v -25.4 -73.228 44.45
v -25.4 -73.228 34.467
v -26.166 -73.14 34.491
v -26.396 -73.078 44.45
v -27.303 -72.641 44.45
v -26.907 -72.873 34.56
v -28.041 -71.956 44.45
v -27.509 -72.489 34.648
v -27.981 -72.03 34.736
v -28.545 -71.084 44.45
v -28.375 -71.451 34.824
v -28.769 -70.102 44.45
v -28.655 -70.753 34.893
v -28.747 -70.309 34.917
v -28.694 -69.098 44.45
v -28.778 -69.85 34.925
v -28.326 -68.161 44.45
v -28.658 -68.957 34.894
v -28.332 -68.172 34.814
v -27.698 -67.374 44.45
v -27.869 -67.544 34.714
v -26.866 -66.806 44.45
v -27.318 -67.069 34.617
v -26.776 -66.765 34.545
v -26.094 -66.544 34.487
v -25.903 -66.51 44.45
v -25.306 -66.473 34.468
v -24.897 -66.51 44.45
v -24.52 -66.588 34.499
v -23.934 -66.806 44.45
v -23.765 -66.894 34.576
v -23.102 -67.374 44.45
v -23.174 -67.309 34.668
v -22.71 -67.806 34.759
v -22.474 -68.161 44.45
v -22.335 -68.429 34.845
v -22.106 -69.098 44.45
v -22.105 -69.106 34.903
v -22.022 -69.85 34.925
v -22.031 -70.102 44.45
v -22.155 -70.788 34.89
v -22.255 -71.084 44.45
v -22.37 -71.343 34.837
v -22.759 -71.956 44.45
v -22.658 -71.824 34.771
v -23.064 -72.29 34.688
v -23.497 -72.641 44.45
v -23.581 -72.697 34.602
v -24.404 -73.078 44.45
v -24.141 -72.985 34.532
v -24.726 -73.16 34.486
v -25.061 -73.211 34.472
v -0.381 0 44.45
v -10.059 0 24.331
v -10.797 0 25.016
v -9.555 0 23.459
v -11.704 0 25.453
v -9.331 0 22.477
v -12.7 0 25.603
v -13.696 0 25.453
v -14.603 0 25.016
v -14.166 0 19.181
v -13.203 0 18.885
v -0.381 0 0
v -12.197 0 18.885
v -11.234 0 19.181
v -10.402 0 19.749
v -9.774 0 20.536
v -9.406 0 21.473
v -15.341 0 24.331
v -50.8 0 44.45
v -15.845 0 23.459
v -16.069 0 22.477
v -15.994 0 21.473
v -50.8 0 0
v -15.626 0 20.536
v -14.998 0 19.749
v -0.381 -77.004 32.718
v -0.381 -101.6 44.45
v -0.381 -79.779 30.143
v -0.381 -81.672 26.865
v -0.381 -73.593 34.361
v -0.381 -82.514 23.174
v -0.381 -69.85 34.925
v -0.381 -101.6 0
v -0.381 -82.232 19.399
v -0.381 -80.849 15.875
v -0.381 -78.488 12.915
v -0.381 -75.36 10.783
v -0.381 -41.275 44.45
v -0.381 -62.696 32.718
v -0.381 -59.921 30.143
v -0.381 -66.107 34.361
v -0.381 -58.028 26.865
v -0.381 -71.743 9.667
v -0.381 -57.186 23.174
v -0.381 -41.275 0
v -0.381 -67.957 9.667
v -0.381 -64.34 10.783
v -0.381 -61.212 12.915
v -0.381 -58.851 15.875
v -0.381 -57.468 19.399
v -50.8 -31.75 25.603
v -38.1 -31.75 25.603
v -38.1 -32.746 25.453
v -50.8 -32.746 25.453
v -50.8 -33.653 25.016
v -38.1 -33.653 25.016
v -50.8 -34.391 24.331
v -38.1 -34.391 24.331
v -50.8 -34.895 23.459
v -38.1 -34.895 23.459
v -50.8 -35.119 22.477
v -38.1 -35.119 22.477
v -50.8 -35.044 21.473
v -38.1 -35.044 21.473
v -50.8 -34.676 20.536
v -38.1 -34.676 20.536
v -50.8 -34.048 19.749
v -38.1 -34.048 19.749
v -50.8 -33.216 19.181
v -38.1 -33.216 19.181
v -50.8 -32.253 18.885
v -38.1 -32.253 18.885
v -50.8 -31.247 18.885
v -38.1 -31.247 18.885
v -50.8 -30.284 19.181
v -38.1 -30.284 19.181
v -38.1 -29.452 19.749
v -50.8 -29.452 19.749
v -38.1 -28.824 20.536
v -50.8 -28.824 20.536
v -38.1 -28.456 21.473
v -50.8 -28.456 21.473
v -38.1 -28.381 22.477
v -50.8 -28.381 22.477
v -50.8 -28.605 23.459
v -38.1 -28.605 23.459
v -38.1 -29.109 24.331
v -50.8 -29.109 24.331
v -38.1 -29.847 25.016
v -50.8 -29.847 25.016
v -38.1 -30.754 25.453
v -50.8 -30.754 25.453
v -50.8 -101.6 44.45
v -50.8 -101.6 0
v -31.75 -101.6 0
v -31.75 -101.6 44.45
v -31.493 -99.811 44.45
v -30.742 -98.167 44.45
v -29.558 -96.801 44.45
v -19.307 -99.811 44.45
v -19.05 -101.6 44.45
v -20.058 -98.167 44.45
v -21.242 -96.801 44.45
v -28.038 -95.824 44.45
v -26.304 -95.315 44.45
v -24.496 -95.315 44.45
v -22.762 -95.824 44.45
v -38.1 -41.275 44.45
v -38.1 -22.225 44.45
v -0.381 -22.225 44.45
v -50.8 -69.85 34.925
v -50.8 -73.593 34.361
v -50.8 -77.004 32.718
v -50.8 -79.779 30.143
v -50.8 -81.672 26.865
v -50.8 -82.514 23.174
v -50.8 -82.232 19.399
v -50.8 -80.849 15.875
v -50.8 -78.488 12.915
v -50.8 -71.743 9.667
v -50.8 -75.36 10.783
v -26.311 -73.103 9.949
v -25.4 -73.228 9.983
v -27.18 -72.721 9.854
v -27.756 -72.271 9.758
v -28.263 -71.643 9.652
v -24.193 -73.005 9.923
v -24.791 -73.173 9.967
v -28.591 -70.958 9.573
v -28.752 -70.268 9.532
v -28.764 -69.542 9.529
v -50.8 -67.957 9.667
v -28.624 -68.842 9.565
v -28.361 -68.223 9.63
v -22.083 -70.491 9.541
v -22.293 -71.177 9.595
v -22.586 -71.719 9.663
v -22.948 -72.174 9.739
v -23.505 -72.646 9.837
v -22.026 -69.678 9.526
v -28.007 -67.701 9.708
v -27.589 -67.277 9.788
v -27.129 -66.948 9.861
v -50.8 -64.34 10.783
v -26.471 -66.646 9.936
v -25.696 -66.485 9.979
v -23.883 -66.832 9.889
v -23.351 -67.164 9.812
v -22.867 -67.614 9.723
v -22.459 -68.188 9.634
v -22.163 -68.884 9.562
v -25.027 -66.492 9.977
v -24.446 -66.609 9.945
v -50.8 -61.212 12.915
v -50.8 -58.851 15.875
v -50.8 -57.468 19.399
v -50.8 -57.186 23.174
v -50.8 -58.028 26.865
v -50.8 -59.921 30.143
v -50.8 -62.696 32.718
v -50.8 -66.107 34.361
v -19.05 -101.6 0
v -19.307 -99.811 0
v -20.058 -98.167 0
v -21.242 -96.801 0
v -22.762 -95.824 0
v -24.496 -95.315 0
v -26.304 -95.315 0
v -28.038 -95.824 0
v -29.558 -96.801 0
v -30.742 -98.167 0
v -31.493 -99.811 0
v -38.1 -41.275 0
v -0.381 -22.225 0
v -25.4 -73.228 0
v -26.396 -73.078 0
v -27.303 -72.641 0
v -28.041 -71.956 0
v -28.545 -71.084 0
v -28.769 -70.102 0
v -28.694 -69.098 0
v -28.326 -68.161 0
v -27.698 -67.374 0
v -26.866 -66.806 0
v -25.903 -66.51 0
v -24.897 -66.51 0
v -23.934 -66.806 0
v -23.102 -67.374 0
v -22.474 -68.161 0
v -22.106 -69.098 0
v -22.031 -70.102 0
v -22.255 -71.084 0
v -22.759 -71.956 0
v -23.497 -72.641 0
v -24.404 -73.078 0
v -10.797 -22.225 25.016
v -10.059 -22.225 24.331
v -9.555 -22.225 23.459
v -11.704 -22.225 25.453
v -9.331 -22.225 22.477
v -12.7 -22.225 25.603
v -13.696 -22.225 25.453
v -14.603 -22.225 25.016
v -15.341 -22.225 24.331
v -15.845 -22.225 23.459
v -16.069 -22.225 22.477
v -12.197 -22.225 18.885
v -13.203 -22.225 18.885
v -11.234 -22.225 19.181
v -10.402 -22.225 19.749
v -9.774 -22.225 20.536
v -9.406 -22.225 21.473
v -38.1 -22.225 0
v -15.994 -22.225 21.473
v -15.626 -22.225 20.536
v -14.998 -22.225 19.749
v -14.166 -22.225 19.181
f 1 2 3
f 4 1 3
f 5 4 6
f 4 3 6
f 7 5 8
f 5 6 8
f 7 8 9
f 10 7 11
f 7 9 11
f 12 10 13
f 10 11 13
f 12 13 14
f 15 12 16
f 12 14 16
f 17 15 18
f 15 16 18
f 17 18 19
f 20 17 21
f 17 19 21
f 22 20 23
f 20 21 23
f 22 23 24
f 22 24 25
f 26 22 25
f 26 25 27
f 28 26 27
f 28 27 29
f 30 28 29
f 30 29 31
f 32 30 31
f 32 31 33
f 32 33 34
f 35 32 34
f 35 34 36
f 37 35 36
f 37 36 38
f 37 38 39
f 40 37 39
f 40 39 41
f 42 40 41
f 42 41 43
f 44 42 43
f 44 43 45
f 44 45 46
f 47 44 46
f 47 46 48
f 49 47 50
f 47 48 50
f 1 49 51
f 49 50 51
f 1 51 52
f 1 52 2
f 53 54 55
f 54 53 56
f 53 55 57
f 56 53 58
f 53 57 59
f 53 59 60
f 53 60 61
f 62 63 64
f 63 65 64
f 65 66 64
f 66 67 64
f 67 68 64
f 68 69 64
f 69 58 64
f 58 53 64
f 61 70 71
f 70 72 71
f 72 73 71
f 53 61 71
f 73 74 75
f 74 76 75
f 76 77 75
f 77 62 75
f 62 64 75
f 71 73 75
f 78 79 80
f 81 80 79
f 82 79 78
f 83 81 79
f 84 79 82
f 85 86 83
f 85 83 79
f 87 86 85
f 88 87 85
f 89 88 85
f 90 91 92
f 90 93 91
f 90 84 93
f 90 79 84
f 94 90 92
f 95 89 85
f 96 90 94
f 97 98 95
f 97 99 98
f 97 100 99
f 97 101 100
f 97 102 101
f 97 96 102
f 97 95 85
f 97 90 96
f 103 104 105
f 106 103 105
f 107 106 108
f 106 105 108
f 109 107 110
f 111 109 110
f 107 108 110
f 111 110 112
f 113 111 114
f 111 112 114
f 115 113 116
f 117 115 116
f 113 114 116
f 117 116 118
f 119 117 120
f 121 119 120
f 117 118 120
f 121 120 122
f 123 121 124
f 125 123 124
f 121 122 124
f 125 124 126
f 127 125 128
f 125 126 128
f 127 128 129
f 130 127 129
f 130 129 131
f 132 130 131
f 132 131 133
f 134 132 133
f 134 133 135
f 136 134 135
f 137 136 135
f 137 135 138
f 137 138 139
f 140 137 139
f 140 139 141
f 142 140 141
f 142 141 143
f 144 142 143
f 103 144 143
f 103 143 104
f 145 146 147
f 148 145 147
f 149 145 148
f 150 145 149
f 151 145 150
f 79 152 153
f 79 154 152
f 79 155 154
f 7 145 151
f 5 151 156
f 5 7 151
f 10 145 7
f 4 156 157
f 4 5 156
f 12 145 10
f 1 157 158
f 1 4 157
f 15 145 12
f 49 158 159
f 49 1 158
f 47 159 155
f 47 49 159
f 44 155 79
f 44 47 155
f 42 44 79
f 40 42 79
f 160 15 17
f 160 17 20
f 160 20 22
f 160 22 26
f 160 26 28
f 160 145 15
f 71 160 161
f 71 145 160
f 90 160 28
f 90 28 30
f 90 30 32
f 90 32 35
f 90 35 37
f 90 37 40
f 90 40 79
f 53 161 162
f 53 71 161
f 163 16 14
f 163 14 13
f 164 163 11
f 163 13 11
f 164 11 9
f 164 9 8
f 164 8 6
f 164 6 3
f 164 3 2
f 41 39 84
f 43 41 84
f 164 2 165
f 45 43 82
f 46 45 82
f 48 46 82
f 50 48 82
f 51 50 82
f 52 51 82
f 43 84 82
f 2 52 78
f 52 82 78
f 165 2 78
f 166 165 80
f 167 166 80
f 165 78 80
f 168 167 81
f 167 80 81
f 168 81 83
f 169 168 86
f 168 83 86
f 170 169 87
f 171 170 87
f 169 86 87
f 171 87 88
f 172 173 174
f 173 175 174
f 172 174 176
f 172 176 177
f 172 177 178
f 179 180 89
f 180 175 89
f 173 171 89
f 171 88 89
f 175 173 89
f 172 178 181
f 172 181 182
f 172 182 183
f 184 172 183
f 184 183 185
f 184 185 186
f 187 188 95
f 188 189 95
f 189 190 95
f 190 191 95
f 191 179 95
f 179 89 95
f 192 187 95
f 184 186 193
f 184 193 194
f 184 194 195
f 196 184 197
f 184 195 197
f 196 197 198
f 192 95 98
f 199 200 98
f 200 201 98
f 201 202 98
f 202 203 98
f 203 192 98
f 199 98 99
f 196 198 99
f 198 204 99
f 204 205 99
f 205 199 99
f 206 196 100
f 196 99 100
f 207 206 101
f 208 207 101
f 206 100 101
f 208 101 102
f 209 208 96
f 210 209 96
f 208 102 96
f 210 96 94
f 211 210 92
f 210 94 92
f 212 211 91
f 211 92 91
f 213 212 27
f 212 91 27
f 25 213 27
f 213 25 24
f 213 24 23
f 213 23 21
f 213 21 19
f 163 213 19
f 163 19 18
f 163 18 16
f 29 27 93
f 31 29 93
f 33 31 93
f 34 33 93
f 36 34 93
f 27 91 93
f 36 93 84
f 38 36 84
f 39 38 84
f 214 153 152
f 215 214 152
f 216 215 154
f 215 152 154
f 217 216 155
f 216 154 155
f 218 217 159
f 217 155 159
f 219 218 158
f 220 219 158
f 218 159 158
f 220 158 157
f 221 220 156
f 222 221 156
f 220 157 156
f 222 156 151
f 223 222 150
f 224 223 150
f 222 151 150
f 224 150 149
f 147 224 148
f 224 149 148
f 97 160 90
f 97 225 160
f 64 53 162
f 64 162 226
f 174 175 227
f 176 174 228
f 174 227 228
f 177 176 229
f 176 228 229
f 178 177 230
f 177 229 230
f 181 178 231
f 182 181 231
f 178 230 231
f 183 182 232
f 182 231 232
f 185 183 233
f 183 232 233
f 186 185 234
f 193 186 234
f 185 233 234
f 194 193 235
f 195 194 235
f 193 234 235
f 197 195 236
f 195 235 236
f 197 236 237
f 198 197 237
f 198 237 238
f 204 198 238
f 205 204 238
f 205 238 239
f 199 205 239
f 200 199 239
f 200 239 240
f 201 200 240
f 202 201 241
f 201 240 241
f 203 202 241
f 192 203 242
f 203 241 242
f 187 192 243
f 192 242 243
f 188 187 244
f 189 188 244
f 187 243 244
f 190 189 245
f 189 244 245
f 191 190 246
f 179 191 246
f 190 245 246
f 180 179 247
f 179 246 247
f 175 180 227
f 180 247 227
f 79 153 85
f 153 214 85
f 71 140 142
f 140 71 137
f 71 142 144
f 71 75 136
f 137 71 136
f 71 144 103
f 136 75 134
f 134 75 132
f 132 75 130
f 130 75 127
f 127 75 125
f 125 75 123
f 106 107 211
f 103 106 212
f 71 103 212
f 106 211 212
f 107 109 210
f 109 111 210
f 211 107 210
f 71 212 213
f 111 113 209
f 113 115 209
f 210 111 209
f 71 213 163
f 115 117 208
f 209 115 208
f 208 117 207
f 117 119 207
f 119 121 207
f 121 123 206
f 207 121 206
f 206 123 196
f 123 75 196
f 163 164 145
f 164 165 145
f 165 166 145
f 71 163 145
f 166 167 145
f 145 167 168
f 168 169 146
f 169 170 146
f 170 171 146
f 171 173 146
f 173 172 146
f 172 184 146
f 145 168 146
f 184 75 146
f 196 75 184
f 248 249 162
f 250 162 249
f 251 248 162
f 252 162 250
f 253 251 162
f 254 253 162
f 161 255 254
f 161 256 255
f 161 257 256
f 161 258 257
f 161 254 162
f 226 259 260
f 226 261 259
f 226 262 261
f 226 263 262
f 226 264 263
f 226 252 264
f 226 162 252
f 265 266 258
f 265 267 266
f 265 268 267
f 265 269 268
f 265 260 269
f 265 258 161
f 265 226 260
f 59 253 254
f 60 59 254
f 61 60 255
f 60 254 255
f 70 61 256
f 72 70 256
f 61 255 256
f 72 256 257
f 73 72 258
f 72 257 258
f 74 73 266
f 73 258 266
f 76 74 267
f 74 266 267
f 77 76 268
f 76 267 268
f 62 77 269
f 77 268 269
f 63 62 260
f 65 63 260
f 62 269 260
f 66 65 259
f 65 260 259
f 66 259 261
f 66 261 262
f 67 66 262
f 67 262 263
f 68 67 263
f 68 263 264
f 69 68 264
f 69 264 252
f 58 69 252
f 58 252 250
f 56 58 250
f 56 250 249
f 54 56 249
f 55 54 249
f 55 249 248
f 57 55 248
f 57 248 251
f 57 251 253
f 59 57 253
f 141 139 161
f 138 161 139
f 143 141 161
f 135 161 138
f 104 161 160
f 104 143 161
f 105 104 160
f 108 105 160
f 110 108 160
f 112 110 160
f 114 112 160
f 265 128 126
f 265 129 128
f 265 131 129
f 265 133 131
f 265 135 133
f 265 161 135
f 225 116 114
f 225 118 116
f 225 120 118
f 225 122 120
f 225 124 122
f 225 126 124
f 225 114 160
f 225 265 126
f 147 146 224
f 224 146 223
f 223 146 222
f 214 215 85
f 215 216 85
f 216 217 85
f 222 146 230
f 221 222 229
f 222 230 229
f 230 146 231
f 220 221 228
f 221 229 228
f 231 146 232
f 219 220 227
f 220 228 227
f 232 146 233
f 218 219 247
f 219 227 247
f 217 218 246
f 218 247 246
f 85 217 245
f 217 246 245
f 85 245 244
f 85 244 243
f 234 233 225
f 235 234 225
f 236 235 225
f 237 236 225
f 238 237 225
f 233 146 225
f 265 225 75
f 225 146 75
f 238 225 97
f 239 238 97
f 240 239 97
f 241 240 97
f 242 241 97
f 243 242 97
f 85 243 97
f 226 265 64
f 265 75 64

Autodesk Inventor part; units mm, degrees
ref_plane "YZ Plane" through (0, 0, 0) normal (1, 0, 0) x (0, 1, 0)
ref_plane "XZ Plane" through (0, 0, 0) normal (0, 1, 0) x (-1, 0, 0)
ref_plane "XY Plane" through (0, 0, 0) normal (0, 0, 1) x (1, 0, 0)
sketch "Sketch1" plane through (0, 0, 0) normal (0, 0, 1) x (1, 0, 0)
  line L0 (0, 0) -> (-50.8, 0)
  line L1 (-50.8, 0) -> (-50.8, -101.6)
  line L2 (-50.8, -101.6) -> (0, -101.6)
  line L3 (0, -22.225) -> (-38.1, -22.225)
  line L4 (-38.1, -22.225) -> (-38.1, -41.275)
  line L5 (-38.1, -41.275) -> (0, -41.275)
  line L6 (0, -101.6) -> (0, -41.275)
  line L7 (0, -22.225) -> (0, 0)
  dimension "d0" = 101.6
  dimension "d1" = 50.8
  dimension "d4" = 22.225
  dimension "d5" = 38.1
  dimension "d6" = 19.05
extrude "Extrusion1" add sketch "Sketch1" along normal blind 44.45
sketch "Sketch2" plane through (0, -22.225, 0) normal (1, 0, 0) x (0, 0, -1)
  line L0 (-44.45, 0) -> (-44.45, 22.225) projected
  line L1 (0, 22.225) -> (0, -79.375) projected
  line L2 (-44.45, 22.225) -> (0, 22.225)
  line L3 (0, 22.225) -> (0, -79.375)
  line L4 (0, -79.375) -> (-44.45, -79.375)
  line L5 (-44.45, -79.375) -> (-44.45, 22.225)
extrude "Extrusion2" cut sketch "Sketch2" against normal blind 0.381
sketch "Sketch3" plane through (-50.8, 0, 44.45) normal (0, 1, 0) x (1, 0, 0)
  line L0 (0, 44.45) -> (0, 0) projected
  line L1 (50.419, 44.45) -> (0, 44.45) projected
  point P0 (50.8, 44.45)
  point P1 (38.1, 22.225)
  dimension "d9" = 38.1
  dimension "d10" = 22.225
hole "Hole1" at (-12.7, 0, 22.225) direction (0, -1, 0) diameter 6.7564 end up to surface clearance for "Flat Head Machine Screw (82)" size "1/4" standard "Ansi Unified Screw Threads"
sketch "Sketch4" plane through (-50.8, -101.6, 0) normal (-1, 0, 0) x (0, 0, 1)
  line L0 (0, 101.6) -> (0, 0) projected
  line L1 (0, 101.6) -> (44.45, 101.6) projected
  point P0 (22.225, 69.85)
  dimension "d18" = 22.225
  dimension "d19" = 31.75
hole "Hole2" at (-50.8, -31.75, 22.225) direction (1, 0, 0) diameter 6.7564 end through all clearance for "Hex Head Bolt" size "1/4" standard "Ansi Unified Screw Threads"
sketch "Sketch5" plane through (-50.8, -101.6, 0) normal (-1, 0, 0) x (0, 0, 1)
  line L0 (0, 101.6) -> (0, 0) projected
  line L1 (0, 101.6) -> (44.45, 101.6) projected
  point P0 (22.225, 31.75)
  dimension "d27" = 22.225
  dimension "d28" = 69.85
hole "Hole3" at (-50.8, -69.85, 22.225) direction (1, 0, 0) diameter 25.4 end through all
sketch "Sketch6" plane through (0, 0, 44.45) normal (0, 0, 1) x (1, 0, 0)
  line L0 (-0.381, 0) -> (-50.8, 0) projected
  line L1 (-50.8, 0) -> (-50.8, -101.6) projected
  point P0 (0, 0)
  point P1 (-25.4, -69.85)
  dimension "d36" = 69.85
  dimension "d37" = 25.4
hole "Hole4" at (-25.4, -69.85, 44.45) direction (0, 0, -1) diameter 6.7564 end through all clearance for "Hex Head Bolt" size "1/4" standard "Ansi Unified Screw Threads"
sketch "Sketch7" plane through (0, 0, 44.45) normal (0, 0, 1) x (1, 0, 0)
  circle A0 centre (-25.4, -101.6) radius 6.35
  line L0 (-0.381, 0) -> (-50.8, 0) projected
  line L1 (-50.8, 0) -> (-50.8, -101.6) projected
  point P0 (0, 0)
  dimension "d45" = 101.6
  dimension "d46" = 25.4
  dimension "d47" = 12.7
extrude "Extrusion3" cut sketch "Sketch7" against normal through all
equation "\"d10\" = 0.5 * width"
equation "\"d18\" = 0.5 * width"
equation "\"d27\" = 0.5 * width"
equation "\"width\" = 44.45"
properties part number "AsBuilt Over Support For Arm"
